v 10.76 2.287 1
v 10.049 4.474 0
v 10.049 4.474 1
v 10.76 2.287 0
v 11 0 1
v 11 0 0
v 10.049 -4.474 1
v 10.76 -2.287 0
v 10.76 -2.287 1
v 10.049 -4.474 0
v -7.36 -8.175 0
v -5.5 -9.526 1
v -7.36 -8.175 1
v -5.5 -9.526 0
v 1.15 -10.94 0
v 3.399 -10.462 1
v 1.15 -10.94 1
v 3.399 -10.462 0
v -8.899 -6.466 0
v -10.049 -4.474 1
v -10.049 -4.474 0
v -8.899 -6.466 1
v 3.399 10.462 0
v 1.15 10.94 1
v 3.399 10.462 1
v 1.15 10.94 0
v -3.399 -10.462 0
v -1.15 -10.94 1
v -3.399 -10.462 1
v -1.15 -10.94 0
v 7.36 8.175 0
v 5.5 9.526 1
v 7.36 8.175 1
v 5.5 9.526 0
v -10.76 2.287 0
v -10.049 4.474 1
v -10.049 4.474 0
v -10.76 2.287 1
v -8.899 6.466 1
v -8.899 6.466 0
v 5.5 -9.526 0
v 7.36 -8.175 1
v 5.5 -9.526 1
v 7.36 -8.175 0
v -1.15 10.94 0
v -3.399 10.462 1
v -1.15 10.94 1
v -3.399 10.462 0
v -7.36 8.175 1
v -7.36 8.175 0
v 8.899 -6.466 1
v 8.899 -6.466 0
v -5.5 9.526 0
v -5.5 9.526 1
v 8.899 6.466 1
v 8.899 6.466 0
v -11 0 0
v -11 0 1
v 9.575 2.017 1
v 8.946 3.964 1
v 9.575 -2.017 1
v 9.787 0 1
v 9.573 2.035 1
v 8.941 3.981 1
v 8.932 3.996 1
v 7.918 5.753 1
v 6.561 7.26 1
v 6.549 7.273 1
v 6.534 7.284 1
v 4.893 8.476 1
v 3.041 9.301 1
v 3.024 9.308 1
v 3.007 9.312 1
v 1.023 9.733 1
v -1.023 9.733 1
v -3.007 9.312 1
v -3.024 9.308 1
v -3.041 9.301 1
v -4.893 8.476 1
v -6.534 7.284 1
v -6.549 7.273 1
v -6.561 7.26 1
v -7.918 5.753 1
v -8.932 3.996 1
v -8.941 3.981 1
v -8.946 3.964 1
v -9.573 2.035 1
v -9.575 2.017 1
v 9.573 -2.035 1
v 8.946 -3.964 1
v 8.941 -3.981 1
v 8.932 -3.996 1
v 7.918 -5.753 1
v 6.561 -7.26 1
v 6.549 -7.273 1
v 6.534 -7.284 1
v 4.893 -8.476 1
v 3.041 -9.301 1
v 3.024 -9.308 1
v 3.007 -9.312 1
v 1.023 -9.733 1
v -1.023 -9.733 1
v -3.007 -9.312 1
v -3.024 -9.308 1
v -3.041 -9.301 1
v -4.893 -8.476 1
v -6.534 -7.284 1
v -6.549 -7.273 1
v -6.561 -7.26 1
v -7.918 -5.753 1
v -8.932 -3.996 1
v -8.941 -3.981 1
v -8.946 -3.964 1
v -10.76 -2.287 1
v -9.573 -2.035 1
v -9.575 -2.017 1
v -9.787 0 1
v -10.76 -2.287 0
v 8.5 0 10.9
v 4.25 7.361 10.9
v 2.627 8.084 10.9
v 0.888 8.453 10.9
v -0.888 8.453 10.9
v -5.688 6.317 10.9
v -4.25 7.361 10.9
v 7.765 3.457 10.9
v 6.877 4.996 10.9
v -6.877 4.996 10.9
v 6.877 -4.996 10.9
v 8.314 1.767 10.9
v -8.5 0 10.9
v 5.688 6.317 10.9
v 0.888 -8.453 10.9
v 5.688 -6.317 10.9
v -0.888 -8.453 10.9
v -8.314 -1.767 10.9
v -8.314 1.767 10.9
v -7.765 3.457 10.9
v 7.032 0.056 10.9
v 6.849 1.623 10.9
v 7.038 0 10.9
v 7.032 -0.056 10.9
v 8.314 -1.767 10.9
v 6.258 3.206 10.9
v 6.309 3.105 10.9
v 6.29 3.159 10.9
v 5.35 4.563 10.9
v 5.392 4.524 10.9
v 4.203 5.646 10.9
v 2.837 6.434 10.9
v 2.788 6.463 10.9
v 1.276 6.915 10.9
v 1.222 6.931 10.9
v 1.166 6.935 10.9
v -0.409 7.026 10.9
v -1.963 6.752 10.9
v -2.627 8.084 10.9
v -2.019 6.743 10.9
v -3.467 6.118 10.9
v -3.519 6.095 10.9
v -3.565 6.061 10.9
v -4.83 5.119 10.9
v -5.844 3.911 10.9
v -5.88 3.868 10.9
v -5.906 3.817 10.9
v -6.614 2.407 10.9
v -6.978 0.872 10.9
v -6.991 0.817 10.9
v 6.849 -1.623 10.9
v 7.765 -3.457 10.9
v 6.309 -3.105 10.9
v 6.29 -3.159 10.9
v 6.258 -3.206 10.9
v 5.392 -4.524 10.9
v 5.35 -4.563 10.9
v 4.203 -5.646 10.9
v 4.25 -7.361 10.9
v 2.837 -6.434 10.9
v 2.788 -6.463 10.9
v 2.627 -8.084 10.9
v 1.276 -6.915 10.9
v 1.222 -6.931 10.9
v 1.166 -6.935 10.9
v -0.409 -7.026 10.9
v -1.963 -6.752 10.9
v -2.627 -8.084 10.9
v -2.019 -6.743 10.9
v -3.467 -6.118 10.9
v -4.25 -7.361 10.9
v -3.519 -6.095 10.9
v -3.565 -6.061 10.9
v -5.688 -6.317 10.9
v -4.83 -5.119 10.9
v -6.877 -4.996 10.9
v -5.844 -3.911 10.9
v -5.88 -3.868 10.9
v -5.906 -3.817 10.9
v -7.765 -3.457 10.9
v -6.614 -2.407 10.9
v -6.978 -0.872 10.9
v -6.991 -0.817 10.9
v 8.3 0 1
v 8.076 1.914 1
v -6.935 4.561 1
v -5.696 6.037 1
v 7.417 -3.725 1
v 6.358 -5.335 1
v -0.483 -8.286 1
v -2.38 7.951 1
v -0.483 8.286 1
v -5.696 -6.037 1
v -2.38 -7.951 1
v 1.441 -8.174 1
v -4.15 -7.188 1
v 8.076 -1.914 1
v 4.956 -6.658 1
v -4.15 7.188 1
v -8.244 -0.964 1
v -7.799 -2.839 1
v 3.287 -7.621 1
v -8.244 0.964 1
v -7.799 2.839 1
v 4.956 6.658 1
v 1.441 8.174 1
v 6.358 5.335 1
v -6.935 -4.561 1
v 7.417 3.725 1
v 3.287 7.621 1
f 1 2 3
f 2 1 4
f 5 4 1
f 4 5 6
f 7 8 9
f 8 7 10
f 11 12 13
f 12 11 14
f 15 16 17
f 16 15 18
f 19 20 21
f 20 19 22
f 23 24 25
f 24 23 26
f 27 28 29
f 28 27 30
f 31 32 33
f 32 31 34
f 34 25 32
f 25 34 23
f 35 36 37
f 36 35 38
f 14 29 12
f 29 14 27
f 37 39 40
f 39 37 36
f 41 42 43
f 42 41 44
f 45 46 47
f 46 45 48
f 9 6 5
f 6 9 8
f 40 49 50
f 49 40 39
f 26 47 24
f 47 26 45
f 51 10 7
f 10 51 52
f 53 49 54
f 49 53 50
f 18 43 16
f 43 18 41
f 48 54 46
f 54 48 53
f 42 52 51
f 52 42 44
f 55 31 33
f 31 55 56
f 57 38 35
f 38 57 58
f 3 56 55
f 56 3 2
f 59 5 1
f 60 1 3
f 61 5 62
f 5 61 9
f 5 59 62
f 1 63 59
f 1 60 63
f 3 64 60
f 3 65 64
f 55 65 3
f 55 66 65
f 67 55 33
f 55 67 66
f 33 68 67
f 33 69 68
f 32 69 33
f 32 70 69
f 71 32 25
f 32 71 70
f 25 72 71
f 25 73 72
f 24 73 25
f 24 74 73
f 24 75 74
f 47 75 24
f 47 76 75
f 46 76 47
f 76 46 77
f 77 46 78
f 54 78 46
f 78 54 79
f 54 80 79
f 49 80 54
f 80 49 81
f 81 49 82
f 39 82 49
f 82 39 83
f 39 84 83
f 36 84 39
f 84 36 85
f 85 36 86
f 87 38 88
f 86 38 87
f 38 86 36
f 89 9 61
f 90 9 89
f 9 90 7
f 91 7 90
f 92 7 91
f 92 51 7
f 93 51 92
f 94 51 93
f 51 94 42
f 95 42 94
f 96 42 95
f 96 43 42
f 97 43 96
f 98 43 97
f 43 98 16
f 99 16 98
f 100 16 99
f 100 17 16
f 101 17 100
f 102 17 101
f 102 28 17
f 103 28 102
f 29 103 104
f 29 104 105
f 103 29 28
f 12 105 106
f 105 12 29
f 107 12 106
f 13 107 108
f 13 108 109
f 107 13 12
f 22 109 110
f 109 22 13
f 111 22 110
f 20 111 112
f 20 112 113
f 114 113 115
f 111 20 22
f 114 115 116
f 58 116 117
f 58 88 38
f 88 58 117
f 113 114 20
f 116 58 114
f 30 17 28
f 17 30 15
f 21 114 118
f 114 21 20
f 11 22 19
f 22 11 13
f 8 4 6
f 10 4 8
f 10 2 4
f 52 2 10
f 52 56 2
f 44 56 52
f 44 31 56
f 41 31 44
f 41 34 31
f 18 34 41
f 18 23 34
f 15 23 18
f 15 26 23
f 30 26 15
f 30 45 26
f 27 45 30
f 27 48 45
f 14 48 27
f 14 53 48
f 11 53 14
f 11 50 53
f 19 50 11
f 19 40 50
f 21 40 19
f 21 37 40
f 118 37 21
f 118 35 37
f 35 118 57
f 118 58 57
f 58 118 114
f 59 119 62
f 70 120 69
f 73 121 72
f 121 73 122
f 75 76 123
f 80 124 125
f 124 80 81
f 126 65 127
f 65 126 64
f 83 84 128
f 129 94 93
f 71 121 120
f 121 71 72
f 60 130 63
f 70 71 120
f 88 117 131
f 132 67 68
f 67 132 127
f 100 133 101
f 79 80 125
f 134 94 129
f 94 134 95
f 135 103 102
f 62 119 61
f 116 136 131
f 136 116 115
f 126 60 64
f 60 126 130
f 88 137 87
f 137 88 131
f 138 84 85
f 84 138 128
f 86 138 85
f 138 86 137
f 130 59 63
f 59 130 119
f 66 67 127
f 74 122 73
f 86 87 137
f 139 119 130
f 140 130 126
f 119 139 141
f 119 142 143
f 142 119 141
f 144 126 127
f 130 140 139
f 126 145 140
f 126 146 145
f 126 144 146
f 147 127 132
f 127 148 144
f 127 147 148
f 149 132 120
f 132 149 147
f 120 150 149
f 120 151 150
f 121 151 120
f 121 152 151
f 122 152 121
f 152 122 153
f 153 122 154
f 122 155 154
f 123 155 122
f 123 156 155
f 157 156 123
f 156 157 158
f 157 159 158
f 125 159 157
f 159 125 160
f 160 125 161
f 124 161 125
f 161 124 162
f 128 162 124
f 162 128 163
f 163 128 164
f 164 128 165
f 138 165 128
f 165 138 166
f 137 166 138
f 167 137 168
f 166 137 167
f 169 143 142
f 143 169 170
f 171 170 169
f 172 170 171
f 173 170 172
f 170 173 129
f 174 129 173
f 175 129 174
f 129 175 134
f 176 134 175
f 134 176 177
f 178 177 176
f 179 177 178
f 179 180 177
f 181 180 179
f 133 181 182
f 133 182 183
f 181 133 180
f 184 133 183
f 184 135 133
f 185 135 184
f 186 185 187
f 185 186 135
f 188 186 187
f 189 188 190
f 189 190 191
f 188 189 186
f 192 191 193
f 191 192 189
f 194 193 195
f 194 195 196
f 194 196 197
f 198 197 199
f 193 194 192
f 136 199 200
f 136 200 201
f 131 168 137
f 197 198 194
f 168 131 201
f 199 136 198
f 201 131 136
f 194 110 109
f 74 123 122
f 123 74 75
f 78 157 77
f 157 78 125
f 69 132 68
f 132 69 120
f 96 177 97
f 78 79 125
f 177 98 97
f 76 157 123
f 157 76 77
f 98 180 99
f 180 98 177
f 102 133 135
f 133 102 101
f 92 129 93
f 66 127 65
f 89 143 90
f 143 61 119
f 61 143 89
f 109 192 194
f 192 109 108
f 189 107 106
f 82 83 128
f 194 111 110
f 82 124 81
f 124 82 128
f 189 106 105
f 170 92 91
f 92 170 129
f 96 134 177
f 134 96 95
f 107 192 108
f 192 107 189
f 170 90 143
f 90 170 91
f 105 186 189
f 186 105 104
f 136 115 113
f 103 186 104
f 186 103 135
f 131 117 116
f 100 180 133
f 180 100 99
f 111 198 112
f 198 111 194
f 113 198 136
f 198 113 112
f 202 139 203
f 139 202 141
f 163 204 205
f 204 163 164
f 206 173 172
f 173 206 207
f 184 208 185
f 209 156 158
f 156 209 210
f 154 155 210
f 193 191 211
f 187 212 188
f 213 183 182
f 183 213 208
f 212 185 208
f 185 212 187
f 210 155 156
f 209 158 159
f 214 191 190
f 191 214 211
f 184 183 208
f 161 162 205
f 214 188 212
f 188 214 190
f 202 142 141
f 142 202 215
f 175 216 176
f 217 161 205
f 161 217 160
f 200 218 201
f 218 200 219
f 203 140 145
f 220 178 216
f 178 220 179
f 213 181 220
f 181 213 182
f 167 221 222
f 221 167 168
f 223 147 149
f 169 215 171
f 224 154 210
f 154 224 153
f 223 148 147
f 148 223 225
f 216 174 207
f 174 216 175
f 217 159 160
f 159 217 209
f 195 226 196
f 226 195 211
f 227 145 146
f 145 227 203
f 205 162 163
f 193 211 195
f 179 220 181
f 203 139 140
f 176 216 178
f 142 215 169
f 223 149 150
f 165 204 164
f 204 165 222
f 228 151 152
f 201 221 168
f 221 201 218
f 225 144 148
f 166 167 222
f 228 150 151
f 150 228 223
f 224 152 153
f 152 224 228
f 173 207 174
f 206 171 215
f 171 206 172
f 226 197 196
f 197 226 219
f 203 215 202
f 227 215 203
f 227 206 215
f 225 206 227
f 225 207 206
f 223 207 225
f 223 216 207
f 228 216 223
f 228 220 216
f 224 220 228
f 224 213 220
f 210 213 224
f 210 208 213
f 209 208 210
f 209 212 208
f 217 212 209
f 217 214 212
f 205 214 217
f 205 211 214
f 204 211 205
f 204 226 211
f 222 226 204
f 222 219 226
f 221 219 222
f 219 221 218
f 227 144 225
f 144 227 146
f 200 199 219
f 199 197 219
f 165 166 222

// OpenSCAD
difference(){
	union(){
		cylinder(r=11,h=1);
		translate([0,0,0.9]) cylinder(r1=9.8, r2=8.5,h=10);
	}	translate([0,0,1]) cylinder(r1=8.3,r2=7,h=10.2);
}
